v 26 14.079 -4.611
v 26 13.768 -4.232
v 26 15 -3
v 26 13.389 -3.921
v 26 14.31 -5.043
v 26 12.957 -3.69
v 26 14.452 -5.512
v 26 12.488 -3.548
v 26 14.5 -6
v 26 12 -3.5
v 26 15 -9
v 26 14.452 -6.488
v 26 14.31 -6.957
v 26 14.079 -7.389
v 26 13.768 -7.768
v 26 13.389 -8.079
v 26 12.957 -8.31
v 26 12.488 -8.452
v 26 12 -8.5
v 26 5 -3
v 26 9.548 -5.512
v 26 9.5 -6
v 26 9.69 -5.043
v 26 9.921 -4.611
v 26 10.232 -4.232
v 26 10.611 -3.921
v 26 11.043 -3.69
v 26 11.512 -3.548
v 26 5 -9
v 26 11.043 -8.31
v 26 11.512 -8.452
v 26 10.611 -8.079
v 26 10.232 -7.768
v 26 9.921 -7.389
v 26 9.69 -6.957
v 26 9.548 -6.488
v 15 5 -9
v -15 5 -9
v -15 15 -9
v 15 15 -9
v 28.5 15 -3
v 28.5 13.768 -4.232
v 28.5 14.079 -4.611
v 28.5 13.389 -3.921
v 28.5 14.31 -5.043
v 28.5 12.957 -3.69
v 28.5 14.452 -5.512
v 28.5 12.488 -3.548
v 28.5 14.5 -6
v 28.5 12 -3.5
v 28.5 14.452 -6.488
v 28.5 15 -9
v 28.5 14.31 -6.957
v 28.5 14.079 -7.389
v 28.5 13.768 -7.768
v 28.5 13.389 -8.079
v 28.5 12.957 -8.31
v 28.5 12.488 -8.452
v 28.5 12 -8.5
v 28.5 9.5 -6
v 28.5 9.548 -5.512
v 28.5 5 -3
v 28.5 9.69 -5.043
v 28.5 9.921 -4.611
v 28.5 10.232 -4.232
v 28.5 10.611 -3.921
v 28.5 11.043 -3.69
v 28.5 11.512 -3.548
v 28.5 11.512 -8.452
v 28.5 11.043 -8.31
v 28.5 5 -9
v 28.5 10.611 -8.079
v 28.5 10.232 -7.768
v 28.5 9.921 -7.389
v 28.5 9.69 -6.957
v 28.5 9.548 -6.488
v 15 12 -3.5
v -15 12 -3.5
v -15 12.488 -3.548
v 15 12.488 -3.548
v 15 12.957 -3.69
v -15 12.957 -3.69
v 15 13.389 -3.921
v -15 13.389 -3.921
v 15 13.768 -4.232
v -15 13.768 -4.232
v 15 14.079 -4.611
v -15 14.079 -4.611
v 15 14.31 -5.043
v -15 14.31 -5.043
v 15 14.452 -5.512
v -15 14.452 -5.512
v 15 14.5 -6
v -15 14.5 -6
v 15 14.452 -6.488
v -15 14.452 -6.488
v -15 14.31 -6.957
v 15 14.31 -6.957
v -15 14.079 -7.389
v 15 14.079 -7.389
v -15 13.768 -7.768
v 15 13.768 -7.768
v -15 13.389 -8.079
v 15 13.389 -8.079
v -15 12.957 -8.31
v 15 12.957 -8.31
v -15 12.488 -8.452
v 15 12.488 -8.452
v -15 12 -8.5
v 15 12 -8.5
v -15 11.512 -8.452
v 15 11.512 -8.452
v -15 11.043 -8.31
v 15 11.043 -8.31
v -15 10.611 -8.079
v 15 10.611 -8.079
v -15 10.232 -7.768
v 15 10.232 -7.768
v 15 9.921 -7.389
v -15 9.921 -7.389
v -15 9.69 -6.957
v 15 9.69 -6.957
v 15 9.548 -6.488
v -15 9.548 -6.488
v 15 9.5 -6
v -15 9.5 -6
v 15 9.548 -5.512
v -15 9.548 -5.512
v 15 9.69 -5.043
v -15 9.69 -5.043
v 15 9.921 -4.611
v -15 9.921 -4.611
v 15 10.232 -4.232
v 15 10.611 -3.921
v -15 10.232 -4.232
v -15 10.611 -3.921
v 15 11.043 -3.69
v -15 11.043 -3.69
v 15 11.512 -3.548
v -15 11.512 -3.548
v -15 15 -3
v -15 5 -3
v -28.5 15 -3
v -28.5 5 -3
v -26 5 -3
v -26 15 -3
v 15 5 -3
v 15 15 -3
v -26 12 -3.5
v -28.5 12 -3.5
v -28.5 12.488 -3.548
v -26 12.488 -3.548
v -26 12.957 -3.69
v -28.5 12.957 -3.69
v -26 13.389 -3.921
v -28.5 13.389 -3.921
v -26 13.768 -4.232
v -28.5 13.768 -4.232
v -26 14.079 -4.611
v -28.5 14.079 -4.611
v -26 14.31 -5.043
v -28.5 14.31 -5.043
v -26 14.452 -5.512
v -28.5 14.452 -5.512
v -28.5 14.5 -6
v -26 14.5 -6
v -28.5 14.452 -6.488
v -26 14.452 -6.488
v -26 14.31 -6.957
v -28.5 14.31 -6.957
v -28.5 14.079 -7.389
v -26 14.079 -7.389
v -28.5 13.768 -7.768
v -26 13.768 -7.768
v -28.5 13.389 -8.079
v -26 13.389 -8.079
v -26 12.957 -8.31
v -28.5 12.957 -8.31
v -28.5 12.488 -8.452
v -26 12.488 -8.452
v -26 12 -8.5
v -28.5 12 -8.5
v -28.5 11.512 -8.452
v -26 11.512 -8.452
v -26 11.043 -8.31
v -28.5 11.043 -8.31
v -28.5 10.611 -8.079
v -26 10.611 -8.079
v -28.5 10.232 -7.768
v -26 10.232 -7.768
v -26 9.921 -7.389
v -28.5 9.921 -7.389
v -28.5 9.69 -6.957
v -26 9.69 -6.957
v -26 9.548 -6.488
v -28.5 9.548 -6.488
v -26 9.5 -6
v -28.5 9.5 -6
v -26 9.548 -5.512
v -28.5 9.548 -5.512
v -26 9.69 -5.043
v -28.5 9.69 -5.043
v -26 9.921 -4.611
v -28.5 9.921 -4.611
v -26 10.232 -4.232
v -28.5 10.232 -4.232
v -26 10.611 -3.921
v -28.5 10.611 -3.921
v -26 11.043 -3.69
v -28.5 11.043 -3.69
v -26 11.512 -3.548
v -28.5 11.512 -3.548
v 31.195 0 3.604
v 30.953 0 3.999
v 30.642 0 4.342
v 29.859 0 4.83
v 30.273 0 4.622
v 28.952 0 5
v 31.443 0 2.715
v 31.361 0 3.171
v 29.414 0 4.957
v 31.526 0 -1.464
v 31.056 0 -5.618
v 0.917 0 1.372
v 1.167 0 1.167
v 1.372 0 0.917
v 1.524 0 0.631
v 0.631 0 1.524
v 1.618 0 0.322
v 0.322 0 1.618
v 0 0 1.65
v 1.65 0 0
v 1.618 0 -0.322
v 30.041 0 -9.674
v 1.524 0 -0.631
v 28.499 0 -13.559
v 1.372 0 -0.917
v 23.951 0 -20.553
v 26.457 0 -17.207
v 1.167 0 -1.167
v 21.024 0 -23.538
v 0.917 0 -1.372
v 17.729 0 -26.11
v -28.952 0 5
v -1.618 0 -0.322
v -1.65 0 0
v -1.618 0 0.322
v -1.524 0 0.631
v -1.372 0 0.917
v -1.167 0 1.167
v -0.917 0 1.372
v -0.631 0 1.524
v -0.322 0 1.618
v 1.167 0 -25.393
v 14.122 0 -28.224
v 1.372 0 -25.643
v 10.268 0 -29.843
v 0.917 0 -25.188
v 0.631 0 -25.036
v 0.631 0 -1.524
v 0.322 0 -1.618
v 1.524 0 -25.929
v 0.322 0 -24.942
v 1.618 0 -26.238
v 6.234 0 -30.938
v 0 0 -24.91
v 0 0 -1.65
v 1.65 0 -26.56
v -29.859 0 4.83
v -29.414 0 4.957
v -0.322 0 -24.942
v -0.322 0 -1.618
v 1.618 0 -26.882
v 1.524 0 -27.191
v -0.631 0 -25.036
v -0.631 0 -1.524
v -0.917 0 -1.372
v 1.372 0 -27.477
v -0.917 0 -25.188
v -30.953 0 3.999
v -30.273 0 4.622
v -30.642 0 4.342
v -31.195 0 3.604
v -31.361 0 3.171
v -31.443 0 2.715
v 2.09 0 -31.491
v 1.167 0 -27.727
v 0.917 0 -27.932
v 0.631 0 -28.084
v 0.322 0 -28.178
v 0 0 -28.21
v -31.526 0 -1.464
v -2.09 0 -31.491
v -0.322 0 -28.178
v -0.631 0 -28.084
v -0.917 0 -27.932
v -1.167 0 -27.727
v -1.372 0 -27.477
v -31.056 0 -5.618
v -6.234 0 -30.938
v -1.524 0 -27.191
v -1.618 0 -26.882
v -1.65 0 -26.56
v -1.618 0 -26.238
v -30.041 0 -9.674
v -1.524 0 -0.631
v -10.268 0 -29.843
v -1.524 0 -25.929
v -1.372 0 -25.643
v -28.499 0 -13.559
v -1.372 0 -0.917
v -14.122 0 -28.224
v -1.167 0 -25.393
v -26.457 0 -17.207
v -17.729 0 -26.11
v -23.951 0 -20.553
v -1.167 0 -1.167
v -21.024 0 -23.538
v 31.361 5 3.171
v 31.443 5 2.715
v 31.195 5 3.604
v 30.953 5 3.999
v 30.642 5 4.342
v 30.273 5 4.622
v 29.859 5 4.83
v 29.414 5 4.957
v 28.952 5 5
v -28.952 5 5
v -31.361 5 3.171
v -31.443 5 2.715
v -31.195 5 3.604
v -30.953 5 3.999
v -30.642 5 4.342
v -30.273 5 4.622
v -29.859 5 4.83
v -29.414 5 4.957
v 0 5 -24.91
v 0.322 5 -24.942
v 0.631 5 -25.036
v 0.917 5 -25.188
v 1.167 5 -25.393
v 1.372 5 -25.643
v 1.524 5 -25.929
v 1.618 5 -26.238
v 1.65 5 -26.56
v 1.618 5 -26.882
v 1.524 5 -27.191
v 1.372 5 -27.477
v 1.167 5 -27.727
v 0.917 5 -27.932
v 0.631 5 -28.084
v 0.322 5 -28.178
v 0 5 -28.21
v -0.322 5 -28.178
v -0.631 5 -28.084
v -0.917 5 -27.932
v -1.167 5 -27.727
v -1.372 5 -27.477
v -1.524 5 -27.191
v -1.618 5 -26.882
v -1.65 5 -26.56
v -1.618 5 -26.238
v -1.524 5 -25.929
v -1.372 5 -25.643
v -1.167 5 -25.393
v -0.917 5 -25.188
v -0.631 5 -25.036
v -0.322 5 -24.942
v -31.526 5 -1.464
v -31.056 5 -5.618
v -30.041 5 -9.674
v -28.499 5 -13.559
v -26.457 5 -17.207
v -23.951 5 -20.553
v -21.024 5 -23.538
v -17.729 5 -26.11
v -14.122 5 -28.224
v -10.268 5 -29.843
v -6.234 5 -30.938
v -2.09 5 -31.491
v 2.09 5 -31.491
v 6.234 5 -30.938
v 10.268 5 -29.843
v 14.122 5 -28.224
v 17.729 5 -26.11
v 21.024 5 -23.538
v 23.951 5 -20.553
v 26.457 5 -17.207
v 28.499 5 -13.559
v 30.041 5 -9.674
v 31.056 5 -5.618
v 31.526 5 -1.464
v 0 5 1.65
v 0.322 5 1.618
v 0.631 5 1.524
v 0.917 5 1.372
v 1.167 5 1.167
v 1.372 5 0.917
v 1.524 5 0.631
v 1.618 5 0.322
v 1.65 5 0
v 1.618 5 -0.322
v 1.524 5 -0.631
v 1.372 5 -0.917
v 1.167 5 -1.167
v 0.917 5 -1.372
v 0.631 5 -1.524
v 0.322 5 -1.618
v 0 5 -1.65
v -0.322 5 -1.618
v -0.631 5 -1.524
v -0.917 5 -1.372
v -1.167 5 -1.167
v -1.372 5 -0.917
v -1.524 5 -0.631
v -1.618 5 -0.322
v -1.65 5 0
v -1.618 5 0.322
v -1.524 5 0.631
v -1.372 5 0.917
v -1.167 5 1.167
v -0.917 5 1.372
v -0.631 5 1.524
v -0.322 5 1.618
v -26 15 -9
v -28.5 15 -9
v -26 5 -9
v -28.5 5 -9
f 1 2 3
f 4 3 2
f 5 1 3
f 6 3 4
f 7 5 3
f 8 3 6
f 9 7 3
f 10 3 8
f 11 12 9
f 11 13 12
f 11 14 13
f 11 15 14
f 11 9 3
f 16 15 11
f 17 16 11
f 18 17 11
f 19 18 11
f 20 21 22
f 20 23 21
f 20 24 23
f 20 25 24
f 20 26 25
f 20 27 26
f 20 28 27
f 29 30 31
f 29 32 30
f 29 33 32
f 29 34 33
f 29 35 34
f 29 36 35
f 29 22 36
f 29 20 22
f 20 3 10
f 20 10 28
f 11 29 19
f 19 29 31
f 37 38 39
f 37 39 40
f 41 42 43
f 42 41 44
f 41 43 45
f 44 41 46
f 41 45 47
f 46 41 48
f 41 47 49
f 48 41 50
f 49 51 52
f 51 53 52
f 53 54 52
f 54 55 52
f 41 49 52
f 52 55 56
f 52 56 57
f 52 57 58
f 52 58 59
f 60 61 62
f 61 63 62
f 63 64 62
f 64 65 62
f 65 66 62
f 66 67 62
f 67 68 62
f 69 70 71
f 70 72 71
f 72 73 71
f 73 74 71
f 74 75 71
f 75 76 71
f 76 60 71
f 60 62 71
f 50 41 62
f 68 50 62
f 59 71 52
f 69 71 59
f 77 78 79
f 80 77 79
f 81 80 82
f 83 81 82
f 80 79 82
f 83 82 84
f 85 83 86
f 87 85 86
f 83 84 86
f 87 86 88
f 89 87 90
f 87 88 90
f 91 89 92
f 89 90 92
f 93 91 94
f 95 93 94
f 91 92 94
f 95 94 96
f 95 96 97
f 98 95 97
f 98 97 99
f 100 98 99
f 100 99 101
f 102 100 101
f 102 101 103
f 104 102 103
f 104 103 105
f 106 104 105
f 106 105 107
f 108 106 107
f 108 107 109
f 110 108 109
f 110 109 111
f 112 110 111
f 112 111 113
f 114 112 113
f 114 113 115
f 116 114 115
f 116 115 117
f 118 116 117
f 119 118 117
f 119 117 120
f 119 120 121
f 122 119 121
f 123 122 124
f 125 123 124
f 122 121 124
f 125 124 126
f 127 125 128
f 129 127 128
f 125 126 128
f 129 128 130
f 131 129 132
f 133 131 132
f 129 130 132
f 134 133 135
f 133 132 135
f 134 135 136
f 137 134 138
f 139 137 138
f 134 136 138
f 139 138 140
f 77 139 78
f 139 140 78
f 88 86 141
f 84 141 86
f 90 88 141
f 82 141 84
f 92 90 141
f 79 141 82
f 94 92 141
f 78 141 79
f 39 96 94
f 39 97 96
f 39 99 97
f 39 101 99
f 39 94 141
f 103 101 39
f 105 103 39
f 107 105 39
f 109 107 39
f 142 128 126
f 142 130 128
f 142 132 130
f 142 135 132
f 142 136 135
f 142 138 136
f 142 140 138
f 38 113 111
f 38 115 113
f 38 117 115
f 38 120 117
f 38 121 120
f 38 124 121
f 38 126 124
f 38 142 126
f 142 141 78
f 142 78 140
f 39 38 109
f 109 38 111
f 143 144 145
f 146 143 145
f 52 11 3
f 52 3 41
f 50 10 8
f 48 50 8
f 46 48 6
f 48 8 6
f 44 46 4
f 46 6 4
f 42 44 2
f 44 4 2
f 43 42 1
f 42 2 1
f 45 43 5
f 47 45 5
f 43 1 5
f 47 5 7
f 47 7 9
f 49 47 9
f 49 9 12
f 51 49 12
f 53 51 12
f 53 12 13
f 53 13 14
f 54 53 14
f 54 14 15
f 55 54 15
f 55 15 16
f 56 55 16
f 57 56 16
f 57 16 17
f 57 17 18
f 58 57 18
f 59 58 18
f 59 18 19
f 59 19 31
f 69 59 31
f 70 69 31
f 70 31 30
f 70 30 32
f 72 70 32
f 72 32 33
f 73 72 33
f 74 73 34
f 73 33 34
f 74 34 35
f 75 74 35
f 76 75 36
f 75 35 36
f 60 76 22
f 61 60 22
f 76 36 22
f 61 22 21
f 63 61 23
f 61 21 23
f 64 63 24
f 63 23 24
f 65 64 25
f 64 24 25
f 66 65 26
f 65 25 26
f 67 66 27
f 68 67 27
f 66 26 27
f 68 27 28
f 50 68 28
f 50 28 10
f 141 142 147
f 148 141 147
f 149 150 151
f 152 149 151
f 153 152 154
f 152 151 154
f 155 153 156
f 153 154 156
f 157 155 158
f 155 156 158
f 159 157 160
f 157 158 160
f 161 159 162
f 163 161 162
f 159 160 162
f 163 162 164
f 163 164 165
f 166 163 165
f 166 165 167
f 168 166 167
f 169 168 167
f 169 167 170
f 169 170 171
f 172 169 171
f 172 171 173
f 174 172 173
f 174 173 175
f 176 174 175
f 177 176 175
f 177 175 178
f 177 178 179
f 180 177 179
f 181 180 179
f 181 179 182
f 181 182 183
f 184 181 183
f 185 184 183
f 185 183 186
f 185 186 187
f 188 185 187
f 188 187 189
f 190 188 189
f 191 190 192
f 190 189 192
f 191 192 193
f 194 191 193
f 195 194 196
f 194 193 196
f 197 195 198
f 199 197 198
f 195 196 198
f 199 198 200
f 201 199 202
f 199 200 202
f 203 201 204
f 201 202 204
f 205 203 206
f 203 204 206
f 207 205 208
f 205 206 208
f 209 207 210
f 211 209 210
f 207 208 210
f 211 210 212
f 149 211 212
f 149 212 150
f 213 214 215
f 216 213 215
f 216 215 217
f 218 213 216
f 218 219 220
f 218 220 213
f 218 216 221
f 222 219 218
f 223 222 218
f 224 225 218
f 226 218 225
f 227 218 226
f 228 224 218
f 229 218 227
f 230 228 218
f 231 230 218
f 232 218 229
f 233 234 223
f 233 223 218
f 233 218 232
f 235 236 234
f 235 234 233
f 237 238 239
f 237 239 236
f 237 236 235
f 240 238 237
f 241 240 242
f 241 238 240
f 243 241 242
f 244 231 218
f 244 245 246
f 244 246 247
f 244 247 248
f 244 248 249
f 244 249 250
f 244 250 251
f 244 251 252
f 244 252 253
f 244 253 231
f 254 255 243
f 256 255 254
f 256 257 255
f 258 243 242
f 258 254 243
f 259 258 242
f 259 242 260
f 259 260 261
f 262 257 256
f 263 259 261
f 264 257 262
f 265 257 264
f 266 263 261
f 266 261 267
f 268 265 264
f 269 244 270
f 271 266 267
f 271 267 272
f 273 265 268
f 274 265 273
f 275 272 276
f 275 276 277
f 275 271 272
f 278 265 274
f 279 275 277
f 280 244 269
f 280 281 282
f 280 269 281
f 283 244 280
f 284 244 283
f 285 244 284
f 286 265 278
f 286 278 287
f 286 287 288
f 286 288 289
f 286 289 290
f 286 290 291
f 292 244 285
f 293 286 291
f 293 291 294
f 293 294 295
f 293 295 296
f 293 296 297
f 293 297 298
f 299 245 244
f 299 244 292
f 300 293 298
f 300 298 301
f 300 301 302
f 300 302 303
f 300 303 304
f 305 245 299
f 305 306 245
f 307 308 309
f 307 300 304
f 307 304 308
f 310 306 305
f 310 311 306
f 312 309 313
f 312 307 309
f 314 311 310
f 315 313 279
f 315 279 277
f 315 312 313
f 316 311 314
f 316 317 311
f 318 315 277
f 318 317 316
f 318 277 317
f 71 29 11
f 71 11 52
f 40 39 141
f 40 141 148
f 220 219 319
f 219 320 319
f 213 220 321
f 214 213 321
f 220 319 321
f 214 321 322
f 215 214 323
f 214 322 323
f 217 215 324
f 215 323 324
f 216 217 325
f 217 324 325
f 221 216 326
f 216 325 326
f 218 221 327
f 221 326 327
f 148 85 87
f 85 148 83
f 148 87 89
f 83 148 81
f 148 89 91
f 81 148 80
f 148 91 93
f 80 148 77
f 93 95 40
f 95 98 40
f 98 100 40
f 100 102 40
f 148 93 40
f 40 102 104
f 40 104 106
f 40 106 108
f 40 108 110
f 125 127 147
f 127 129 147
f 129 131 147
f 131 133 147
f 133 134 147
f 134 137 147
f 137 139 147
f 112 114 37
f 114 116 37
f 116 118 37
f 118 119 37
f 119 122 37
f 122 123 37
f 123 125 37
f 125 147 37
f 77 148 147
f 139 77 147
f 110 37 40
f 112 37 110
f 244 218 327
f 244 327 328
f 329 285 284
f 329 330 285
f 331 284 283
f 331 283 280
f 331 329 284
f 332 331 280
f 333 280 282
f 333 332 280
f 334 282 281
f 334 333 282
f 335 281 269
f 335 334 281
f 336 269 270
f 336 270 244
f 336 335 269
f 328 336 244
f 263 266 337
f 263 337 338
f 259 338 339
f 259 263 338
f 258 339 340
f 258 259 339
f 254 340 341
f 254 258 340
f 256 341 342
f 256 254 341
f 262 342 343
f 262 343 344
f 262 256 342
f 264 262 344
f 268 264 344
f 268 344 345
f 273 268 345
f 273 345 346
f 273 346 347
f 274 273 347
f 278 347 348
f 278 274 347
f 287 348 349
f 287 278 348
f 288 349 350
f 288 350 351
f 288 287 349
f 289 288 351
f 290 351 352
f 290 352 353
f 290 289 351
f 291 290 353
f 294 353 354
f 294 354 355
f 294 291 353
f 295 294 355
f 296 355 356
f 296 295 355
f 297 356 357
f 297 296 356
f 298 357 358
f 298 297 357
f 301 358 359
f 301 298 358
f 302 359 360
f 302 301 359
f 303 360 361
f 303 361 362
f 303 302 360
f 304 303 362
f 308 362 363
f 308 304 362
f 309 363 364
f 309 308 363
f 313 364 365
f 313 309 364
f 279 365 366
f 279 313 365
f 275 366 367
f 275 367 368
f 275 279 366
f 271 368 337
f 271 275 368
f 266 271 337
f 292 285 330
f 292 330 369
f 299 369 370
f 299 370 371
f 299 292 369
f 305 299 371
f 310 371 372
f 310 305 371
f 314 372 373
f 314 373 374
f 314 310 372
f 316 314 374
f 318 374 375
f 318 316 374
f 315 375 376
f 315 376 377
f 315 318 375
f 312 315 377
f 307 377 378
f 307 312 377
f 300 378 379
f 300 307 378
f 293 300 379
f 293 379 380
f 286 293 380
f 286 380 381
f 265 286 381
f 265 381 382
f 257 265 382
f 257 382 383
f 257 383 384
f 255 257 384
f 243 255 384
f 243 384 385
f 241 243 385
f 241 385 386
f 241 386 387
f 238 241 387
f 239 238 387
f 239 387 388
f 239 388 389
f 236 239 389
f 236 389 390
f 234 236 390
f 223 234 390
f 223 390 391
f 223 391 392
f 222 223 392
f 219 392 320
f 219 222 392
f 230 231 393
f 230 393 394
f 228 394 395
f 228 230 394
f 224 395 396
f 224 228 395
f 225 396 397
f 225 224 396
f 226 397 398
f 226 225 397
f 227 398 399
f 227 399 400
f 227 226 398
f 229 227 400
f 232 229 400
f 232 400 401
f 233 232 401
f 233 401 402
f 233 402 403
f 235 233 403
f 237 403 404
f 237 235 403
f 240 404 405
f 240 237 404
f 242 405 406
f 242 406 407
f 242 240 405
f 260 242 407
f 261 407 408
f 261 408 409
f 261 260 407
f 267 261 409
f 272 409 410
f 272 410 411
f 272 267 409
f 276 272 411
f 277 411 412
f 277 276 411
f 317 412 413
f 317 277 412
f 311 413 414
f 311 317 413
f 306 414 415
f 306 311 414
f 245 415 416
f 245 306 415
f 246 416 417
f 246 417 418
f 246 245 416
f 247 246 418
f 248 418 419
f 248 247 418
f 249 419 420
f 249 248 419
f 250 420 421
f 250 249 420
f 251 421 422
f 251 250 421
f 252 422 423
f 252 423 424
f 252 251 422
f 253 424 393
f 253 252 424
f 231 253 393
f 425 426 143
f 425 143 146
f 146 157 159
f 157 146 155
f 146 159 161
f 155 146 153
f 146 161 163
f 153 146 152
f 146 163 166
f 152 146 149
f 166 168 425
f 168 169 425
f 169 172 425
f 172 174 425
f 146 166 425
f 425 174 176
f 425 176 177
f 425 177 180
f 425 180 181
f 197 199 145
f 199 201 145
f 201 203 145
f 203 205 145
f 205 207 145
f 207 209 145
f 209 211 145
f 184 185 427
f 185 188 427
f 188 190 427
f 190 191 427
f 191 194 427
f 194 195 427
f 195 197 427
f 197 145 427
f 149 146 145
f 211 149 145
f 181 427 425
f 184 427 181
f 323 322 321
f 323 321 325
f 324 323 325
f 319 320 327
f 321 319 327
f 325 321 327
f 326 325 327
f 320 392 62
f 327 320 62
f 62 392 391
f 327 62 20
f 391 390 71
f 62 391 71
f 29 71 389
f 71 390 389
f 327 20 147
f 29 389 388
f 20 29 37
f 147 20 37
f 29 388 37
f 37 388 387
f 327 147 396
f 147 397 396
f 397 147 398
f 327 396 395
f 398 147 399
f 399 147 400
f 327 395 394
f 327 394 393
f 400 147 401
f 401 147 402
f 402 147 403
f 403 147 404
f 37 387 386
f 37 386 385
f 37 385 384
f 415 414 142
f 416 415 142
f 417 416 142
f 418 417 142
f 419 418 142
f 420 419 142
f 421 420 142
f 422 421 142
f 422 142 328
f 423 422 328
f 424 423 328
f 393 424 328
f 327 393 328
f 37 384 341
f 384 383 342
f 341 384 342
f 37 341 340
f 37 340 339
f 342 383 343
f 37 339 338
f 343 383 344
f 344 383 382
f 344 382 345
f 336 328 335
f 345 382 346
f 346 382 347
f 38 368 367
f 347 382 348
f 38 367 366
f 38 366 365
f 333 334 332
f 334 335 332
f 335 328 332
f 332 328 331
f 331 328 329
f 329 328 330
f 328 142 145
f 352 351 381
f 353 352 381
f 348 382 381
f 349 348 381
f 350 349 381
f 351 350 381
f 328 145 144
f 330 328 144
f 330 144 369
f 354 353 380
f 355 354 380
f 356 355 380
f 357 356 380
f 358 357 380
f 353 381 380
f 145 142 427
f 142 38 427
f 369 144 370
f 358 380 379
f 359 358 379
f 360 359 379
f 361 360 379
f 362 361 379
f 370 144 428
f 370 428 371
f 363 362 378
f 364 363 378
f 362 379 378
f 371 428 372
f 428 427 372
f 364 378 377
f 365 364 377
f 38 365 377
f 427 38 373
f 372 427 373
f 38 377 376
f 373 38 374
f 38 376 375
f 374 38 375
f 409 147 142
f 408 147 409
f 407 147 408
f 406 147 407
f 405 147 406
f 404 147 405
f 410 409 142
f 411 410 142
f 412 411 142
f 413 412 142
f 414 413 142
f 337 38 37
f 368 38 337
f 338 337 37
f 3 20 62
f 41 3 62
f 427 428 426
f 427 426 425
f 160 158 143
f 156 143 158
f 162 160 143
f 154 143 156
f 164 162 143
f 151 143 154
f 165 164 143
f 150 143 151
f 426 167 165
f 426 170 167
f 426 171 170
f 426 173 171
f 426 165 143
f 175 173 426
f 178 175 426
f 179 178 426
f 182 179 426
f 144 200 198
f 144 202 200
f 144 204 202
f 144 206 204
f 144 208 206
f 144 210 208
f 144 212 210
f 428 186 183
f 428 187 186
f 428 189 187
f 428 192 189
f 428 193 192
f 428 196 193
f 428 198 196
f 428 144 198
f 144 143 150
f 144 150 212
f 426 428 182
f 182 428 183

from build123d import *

# Parameters (mm, degrees)
SKETCH1_R           = 1.65
BOSS_EXTRUDE1_DEPTH = 5
FILLET1_R           = 2.5
SKETCH2_W           = 2.5
SKETCH2_H           = 6
SKETCH2_W_2         = 30
BOSS_EXTRUDE2_DEPTH = 10
SKETCH3_R           = 2.5
CUT_EXTRUDE1_DEPTH  = 70.485517916


with BuildPart() as part:
    # Sketch1 → Boss-Extrude1 (new body)
    with BuildSketch(Plane(origin=(0, 0, 0), x_dir=(1, 0, 0), z_dir=(0, 1, 0))):
        with BuildLine():
            Line((0, -5), (-31.161412035, -5))
            ThreePointArc((-31.161412035, -5), (0, 31.56), (31.161412035, -5))
            Line((31.161412035, -5), (0, -5))
        make_face()
        with Locations(Location((0, 0, 0), (0, 0, 270))):
            Circle(SKETCH1_R, mode=Mode.SUBTRACT)
        with Locations(Location((0, 26.56, 0), (0, 0, 270))):
            Circle(SKETCH1_R, mode=Mode.SUBTRACT)
    extrude(amount=BOSS_EXTRUDE1_DEPTH)

    # Fillet1
    fillet1_edges = [part.edges().sort_by_distance(p)[0] for p in [
        (31.161412035, 2.5, 5),
        (-31.161412035, 2.5, 5),
    ]]
    fillet(fillet1_edges, radius=FILLET1_R)

    # Sketch2 → Boss-Extrude2 (add)
    with BuildSketch(Plane(origin=(0, 5, 0), x_dir=(1, 0, 0), z_dir=(0, 1, 0))):
        with Locations((-27.25, 6)):
            Rectangle(SKETCH2_W, SKETCH2_H)
        with Locations((27.25, 6)):
            Rectangle(SKETCH2_W, SKETCH2_H)
        with Locations((0, 6)):
            Rectangle(SKETCH2_W_2, SKETCH2_H)
    extrude(amount=BOSS_EXTRUDE2_DEPTH)

    # Sketch3 → Cut-Extrude1 (cut, through all)
    with BuildSketch(Plane.ZY.offset(28.5)):
        with Locations((-6, 12)):
            Circle(SKETCH3_R)
    extrude(amount=-CUT_EXTRUDE1_DEPTH, mode=Mode.SUBTRACT)


solid = part.part
